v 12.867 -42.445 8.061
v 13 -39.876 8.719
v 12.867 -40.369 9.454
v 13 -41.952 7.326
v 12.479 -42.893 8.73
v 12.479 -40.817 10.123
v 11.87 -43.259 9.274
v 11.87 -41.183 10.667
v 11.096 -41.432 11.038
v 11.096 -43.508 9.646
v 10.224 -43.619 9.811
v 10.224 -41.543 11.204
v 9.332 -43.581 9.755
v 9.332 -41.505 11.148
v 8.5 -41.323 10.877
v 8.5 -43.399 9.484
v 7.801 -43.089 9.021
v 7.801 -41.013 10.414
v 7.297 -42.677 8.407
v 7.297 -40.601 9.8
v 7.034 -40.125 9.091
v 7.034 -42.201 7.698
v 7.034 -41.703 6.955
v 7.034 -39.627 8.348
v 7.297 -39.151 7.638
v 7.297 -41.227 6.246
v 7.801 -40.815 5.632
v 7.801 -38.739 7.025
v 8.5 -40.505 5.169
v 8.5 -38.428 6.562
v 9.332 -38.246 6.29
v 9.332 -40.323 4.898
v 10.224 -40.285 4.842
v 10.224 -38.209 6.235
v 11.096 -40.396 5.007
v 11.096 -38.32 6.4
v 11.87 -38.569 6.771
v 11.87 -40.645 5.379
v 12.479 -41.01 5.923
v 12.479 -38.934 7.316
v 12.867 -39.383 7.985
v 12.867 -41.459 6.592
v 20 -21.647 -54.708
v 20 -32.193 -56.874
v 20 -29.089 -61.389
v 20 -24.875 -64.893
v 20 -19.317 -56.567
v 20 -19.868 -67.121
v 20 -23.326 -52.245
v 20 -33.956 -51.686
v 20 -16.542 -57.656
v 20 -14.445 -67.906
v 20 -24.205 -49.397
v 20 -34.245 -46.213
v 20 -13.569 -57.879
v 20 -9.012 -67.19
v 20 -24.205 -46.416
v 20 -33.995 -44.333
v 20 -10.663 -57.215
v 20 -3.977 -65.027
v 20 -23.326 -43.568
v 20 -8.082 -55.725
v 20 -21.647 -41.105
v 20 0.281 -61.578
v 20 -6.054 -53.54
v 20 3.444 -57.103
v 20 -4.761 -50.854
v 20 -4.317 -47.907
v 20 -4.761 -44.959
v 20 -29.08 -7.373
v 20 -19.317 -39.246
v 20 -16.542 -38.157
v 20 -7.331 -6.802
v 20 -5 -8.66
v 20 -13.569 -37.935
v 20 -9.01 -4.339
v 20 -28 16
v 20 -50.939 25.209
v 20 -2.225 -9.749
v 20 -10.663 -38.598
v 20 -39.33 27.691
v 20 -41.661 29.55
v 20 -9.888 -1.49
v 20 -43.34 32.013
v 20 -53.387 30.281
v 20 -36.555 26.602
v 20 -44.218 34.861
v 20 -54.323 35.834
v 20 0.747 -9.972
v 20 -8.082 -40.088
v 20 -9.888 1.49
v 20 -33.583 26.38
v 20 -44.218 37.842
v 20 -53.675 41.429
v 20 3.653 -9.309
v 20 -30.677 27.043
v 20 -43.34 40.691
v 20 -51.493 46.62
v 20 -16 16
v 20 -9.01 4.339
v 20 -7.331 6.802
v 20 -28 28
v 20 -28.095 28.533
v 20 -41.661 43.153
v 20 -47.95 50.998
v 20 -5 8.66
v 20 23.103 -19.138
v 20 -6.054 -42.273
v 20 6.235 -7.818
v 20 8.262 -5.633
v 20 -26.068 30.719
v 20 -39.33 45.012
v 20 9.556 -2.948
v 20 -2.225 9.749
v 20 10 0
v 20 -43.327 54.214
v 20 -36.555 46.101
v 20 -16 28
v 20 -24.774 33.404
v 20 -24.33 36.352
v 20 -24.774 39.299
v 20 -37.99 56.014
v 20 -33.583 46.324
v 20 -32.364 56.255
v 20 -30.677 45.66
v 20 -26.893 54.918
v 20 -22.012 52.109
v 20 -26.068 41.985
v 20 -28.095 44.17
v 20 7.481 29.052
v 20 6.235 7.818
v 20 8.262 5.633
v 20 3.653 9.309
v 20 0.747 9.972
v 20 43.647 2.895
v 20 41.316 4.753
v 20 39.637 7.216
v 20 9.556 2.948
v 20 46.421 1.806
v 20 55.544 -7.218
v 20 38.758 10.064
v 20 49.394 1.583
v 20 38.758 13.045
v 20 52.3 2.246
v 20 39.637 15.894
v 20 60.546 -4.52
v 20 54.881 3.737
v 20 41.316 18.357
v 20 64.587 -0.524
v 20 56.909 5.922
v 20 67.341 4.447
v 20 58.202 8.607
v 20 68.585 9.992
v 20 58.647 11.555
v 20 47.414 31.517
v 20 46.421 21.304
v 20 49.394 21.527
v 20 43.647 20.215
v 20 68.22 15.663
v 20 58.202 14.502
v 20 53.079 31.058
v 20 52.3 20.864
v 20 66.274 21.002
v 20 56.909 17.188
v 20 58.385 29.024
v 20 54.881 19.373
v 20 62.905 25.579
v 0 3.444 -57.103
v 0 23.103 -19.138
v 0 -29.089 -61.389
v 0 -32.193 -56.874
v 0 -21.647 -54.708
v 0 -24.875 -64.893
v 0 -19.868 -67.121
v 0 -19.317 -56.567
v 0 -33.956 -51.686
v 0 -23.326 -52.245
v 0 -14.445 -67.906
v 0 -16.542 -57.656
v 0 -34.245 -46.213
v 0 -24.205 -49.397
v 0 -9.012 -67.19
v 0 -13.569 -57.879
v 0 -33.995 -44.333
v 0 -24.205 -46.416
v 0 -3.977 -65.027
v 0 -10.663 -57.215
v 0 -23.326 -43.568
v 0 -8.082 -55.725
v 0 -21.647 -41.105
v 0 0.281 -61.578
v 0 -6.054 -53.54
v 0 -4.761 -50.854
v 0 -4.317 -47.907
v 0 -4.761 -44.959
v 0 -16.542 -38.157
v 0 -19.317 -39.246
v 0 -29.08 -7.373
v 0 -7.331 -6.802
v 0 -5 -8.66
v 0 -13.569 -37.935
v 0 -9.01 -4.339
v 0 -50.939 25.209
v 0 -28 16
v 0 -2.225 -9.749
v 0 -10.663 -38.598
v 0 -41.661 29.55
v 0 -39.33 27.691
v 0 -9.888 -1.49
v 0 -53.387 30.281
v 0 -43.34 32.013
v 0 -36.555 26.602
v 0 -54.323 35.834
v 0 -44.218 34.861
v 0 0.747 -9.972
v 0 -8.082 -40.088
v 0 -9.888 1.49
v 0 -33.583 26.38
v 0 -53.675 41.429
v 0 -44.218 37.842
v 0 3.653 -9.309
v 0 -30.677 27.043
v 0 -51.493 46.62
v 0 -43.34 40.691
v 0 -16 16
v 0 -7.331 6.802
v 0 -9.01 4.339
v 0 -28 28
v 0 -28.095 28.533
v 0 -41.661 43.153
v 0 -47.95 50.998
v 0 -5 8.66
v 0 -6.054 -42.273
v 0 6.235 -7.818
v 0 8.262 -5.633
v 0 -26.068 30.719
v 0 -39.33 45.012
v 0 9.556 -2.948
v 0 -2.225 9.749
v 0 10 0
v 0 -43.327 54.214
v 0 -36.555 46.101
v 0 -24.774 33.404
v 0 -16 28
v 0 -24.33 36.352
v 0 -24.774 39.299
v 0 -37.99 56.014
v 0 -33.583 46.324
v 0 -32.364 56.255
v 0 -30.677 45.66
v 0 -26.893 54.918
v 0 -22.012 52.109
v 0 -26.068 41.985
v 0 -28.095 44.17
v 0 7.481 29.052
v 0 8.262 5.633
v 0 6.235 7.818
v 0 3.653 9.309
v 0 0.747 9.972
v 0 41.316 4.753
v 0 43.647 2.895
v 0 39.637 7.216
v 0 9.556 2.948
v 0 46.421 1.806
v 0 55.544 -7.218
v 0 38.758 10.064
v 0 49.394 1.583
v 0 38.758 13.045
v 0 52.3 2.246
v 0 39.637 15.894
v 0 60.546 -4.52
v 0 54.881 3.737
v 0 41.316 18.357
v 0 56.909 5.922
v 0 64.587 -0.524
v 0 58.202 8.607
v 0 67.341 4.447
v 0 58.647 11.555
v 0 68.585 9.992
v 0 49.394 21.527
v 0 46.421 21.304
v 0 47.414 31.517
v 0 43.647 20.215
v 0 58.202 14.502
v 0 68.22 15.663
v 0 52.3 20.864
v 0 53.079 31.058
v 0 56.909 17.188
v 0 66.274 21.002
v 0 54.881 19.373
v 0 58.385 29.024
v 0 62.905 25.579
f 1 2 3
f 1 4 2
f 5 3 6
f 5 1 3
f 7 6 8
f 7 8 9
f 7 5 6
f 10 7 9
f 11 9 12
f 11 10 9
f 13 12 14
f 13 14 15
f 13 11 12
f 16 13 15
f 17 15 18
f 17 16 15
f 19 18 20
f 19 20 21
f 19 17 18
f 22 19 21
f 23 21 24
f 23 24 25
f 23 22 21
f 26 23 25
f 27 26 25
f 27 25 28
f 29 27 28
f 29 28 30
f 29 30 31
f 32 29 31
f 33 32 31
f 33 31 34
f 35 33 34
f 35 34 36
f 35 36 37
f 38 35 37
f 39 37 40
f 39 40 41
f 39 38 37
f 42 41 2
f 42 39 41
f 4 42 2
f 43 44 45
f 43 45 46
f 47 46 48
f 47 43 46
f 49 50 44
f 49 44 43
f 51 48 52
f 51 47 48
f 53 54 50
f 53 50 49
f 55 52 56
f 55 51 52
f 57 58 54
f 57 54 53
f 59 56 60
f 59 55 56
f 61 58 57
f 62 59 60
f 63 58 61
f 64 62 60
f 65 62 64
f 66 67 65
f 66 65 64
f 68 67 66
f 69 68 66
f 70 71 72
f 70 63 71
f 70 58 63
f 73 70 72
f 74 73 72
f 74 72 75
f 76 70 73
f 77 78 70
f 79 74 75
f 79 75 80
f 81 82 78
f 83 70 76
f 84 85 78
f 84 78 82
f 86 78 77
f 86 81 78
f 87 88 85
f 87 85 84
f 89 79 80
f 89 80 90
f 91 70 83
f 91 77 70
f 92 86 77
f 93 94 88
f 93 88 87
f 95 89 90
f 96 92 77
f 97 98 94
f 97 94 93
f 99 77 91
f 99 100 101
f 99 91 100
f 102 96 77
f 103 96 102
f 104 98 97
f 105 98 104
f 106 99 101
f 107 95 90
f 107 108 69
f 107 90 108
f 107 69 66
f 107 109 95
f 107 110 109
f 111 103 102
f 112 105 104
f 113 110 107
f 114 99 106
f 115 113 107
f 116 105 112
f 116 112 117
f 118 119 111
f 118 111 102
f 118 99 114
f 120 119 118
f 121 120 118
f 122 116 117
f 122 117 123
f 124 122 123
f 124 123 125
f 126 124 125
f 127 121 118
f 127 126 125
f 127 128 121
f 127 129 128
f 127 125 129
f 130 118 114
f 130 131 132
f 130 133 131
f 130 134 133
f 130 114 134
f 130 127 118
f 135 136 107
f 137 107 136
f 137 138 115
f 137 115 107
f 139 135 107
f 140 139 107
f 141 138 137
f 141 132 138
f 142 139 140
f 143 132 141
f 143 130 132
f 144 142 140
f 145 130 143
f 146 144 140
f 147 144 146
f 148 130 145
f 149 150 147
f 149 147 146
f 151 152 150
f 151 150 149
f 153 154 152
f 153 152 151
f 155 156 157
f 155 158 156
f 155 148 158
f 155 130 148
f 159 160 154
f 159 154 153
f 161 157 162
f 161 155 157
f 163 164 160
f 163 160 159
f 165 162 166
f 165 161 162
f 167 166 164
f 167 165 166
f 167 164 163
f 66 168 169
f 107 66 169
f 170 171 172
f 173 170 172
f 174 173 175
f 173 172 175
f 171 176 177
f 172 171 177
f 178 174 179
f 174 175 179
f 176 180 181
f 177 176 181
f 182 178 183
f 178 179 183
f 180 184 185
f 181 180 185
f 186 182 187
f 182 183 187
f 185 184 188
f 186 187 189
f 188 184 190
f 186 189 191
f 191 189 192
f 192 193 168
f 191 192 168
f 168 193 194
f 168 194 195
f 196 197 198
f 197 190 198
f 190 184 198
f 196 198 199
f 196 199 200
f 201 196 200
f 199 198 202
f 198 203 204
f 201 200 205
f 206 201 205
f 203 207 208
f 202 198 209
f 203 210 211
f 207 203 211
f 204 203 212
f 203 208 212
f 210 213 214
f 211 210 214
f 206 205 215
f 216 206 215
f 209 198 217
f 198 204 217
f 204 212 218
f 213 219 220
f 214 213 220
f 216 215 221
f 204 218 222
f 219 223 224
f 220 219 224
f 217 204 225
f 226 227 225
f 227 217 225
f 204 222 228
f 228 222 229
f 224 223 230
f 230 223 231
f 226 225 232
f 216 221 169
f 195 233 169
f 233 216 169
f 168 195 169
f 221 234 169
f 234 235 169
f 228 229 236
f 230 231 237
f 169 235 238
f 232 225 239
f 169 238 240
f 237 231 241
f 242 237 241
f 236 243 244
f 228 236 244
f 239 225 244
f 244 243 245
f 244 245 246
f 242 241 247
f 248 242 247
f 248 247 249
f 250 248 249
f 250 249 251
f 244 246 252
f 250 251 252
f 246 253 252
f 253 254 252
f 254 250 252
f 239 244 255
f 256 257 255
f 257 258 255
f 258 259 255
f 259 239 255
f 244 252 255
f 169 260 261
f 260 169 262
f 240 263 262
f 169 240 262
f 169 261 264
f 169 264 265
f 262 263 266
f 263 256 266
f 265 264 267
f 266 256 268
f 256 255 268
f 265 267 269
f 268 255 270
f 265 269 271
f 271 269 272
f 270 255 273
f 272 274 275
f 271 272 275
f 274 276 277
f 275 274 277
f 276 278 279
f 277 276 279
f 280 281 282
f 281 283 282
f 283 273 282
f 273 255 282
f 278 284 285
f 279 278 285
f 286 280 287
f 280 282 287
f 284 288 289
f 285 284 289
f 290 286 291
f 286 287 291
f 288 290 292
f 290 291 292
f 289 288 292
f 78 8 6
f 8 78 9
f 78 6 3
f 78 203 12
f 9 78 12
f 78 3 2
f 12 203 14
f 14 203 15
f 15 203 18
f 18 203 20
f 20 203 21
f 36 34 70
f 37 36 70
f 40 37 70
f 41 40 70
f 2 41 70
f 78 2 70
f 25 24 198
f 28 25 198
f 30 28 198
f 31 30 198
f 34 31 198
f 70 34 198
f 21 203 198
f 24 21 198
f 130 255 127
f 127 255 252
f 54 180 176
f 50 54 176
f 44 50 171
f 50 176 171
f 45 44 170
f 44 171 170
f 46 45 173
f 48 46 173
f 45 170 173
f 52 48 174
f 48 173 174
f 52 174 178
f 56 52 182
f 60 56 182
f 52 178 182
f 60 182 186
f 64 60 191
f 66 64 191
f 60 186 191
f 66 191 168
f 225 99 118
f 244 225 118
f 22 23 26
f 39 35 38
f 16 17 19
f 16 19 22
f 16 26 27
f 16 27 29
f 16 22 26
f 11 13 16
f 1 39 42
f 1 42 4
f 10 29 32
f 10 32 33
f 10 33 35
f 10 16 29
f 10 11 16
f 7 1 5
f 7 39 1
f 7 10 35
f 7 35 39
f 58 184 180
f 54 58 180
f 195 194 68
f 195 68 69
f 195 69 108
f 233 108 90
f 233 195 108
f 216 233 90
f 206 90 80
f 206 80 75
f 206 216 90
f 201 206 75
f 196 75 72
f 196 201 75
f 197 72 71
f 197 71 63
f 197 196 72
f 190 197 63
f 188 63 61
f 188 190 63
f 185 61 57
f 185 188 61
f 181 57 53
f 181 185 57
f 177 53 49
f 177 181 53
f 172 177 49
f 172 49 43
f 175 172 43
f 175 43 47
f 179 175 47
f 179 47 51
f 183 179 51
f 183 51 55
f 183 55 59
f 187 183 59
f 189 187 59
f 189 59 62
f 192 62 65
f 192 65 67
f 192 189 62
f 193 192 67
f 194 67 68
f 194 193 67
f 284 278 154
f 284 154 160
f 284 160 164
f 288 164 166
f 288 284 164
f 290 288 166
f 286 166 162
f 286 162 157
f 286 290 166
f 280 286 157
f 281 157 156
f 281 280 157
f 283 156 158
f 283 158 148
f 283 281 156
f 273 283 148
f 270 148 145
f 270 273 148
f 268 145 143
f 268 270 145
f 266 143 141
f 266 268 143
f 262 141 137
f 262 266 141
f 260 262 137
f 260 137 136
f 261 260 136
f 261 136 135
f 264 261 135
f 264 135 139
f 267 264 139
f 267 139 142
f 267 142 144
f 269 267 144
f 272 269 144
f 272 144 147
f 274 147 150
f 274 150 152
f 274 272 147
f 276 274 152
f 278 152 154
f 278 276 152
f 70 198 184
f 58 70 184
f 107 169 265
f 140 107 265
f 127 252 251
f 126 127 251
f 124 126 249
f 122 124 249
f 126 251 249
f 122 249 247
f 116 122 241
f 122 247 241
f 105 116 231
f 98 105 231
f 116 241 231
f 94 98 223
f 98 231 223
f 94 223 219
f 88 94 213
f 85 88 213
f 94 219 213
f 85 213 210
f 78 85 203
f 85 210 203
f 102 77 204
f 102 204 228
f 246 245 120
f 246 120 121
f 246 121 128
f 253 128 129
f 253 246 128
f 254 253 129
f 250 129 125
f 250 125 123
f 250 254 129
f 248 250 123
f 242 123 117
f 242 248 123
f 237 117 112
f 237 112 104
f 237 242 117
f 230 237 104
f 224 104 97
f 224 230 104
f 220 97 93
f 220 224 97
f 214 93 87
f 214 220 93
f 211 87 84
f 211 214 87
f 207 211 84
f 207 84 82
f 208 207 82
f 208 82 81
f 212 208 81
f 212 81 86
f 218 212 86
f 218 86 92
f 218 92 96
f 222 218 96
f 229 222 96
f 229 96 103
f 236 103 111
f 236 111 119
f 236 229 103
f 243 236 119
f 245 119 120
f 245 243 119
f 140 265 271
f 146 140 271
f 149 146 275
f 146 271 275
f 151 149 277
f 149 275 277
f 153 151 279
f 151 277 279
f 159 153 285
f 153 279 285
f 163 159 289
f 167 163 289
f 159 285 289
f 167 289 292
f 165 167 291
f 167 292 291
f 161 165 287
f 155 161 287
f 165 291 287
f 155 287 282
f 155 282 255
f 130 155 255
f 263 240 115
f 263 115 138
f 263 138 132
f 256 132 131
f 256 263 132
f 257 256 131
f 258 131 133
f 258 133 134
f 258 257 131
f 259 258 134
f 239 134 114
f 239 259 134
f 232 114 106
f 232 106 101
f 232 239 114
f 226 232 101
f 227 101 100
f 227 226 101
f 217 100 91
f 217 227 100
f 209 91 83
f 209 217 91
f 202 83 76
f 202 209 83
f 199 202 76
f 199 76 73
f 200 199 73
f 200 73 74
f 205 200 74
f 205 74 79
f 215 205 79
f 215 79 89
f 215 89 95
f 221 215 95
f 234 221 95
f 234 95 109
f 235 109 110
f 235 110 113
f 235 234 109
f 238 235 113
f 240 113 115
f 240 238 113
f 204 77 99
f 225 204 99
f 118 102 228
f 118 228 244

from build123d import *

# Parameters (mm, degrees)
F0_R     = 10
F1_DEPTH = 20
F2_R     = 3
F3_DEPTH = 2.5
F4_W     = 12
F4_H     = 12
F5_DEPTH = 30


with BuildPart() as f1:
    # F0 (on Right) → F1 (new body)
    with BuildSketch(Plane.YZ):
        with BuildLine():
            Line((7.481455, 29.052157), (-22.012425, 52.10852))
            ThreePointArc((-22.012425, 52.10852), (-47.949661, 50.997752), (-50.938718, 25.20939))
            Line((-50.938718, 25.20939), (-29.07978, -7.373356))
            ThreePointArc((-29.07978, -7.373356), (-21.17372, 21.252614), (7.481455, 29.052157))
        make_face()
        with Locations((-34.330039, 36.351732)):
            Circle(F0_R, mode=Mode.SUBTRACT)
        with BuildLine():
            Line((47.414482, 31.516835), (7.481455, 29.052157))
            ThreePointArc((7.481455, 29.052157), (23.711217, 18.378742), (30, 0))
            ThreePointArc((30, 0), (28.223022, -10.17158), (23.102597, -19.138182))
            Line((23.102597, -19.138182), (55.544301, -7.218058))
            ThreePointArc((55.544301, -7.218058), (68.220071, 15.662983), (47.414482, 31.516835))
        make_face()
        with Locations((48.646543, 11.55482)):
            Circle(F0_R, mode=Mode.SUBTRACT)
        with BuildLine():
            ThreePointArc((23.102597, -19.138182), (-6.598065, -29.265432), (-29.07978, -7.373356))
            Line((-29.07978, -7.373356), (-33.994642, -44.332917))
            Line((-33.994642, -44.332917), (-34.244702, -46.213358))
            ThreePointArc((-34.244702, -46.213358), (-19.868232, -67.120566), (3.443665, -57.103095))
            Line((3.443665, -57.103095), (23.102597, -19.138182))
        make_face()
        with Locations((-14.316504, -47.906552)):
            Circle(F0_R, mode=Mode.SUBTRACT)
        with BuildLine():
            ThreePointArc((30, 0), (23.711217, 18.378742), (7.481455, 29.052157))
            ThreePointArc((7.481455, 29.052157), (-21.17372, 21.252614), (-29.07978, -7.373356))
            ThreePointArc((-29.07978, -7.373356), (-6.598065, -29.265432), (23.102597, -19.138182))
            ThreePointArc((23.102597, -19.138182), (28.223022, -10.17158), (30, 0))
        make_face()
        Circle(F0_R, mode=Mode.SUBTRACT)
    extrude(amount=F1_DEPTH)

    # F2 (on face) → F3 (join, symmetric)
    with BuildSketch(Plane(origin=(0, -23.46529, -15.742268), x_dir=(1, 0, 0), z_dir=(0, -0.830434, -0.557117))):
        with Locations((10, 29.456303)):
            Circle(F2_R)
    extrude(amount=F3_DEPTH, both=True)

    # F4 (on face) → F5 (cut)
    with BuildSketch(Plane.YZ.offset(20)):
        with Locations((-22, 22)):
            Rectangle(F4_W, F4_H)
    extrude(amount=-F5_DEPTH, mode=Mode.SUBTRACT)


solid = f1.part
